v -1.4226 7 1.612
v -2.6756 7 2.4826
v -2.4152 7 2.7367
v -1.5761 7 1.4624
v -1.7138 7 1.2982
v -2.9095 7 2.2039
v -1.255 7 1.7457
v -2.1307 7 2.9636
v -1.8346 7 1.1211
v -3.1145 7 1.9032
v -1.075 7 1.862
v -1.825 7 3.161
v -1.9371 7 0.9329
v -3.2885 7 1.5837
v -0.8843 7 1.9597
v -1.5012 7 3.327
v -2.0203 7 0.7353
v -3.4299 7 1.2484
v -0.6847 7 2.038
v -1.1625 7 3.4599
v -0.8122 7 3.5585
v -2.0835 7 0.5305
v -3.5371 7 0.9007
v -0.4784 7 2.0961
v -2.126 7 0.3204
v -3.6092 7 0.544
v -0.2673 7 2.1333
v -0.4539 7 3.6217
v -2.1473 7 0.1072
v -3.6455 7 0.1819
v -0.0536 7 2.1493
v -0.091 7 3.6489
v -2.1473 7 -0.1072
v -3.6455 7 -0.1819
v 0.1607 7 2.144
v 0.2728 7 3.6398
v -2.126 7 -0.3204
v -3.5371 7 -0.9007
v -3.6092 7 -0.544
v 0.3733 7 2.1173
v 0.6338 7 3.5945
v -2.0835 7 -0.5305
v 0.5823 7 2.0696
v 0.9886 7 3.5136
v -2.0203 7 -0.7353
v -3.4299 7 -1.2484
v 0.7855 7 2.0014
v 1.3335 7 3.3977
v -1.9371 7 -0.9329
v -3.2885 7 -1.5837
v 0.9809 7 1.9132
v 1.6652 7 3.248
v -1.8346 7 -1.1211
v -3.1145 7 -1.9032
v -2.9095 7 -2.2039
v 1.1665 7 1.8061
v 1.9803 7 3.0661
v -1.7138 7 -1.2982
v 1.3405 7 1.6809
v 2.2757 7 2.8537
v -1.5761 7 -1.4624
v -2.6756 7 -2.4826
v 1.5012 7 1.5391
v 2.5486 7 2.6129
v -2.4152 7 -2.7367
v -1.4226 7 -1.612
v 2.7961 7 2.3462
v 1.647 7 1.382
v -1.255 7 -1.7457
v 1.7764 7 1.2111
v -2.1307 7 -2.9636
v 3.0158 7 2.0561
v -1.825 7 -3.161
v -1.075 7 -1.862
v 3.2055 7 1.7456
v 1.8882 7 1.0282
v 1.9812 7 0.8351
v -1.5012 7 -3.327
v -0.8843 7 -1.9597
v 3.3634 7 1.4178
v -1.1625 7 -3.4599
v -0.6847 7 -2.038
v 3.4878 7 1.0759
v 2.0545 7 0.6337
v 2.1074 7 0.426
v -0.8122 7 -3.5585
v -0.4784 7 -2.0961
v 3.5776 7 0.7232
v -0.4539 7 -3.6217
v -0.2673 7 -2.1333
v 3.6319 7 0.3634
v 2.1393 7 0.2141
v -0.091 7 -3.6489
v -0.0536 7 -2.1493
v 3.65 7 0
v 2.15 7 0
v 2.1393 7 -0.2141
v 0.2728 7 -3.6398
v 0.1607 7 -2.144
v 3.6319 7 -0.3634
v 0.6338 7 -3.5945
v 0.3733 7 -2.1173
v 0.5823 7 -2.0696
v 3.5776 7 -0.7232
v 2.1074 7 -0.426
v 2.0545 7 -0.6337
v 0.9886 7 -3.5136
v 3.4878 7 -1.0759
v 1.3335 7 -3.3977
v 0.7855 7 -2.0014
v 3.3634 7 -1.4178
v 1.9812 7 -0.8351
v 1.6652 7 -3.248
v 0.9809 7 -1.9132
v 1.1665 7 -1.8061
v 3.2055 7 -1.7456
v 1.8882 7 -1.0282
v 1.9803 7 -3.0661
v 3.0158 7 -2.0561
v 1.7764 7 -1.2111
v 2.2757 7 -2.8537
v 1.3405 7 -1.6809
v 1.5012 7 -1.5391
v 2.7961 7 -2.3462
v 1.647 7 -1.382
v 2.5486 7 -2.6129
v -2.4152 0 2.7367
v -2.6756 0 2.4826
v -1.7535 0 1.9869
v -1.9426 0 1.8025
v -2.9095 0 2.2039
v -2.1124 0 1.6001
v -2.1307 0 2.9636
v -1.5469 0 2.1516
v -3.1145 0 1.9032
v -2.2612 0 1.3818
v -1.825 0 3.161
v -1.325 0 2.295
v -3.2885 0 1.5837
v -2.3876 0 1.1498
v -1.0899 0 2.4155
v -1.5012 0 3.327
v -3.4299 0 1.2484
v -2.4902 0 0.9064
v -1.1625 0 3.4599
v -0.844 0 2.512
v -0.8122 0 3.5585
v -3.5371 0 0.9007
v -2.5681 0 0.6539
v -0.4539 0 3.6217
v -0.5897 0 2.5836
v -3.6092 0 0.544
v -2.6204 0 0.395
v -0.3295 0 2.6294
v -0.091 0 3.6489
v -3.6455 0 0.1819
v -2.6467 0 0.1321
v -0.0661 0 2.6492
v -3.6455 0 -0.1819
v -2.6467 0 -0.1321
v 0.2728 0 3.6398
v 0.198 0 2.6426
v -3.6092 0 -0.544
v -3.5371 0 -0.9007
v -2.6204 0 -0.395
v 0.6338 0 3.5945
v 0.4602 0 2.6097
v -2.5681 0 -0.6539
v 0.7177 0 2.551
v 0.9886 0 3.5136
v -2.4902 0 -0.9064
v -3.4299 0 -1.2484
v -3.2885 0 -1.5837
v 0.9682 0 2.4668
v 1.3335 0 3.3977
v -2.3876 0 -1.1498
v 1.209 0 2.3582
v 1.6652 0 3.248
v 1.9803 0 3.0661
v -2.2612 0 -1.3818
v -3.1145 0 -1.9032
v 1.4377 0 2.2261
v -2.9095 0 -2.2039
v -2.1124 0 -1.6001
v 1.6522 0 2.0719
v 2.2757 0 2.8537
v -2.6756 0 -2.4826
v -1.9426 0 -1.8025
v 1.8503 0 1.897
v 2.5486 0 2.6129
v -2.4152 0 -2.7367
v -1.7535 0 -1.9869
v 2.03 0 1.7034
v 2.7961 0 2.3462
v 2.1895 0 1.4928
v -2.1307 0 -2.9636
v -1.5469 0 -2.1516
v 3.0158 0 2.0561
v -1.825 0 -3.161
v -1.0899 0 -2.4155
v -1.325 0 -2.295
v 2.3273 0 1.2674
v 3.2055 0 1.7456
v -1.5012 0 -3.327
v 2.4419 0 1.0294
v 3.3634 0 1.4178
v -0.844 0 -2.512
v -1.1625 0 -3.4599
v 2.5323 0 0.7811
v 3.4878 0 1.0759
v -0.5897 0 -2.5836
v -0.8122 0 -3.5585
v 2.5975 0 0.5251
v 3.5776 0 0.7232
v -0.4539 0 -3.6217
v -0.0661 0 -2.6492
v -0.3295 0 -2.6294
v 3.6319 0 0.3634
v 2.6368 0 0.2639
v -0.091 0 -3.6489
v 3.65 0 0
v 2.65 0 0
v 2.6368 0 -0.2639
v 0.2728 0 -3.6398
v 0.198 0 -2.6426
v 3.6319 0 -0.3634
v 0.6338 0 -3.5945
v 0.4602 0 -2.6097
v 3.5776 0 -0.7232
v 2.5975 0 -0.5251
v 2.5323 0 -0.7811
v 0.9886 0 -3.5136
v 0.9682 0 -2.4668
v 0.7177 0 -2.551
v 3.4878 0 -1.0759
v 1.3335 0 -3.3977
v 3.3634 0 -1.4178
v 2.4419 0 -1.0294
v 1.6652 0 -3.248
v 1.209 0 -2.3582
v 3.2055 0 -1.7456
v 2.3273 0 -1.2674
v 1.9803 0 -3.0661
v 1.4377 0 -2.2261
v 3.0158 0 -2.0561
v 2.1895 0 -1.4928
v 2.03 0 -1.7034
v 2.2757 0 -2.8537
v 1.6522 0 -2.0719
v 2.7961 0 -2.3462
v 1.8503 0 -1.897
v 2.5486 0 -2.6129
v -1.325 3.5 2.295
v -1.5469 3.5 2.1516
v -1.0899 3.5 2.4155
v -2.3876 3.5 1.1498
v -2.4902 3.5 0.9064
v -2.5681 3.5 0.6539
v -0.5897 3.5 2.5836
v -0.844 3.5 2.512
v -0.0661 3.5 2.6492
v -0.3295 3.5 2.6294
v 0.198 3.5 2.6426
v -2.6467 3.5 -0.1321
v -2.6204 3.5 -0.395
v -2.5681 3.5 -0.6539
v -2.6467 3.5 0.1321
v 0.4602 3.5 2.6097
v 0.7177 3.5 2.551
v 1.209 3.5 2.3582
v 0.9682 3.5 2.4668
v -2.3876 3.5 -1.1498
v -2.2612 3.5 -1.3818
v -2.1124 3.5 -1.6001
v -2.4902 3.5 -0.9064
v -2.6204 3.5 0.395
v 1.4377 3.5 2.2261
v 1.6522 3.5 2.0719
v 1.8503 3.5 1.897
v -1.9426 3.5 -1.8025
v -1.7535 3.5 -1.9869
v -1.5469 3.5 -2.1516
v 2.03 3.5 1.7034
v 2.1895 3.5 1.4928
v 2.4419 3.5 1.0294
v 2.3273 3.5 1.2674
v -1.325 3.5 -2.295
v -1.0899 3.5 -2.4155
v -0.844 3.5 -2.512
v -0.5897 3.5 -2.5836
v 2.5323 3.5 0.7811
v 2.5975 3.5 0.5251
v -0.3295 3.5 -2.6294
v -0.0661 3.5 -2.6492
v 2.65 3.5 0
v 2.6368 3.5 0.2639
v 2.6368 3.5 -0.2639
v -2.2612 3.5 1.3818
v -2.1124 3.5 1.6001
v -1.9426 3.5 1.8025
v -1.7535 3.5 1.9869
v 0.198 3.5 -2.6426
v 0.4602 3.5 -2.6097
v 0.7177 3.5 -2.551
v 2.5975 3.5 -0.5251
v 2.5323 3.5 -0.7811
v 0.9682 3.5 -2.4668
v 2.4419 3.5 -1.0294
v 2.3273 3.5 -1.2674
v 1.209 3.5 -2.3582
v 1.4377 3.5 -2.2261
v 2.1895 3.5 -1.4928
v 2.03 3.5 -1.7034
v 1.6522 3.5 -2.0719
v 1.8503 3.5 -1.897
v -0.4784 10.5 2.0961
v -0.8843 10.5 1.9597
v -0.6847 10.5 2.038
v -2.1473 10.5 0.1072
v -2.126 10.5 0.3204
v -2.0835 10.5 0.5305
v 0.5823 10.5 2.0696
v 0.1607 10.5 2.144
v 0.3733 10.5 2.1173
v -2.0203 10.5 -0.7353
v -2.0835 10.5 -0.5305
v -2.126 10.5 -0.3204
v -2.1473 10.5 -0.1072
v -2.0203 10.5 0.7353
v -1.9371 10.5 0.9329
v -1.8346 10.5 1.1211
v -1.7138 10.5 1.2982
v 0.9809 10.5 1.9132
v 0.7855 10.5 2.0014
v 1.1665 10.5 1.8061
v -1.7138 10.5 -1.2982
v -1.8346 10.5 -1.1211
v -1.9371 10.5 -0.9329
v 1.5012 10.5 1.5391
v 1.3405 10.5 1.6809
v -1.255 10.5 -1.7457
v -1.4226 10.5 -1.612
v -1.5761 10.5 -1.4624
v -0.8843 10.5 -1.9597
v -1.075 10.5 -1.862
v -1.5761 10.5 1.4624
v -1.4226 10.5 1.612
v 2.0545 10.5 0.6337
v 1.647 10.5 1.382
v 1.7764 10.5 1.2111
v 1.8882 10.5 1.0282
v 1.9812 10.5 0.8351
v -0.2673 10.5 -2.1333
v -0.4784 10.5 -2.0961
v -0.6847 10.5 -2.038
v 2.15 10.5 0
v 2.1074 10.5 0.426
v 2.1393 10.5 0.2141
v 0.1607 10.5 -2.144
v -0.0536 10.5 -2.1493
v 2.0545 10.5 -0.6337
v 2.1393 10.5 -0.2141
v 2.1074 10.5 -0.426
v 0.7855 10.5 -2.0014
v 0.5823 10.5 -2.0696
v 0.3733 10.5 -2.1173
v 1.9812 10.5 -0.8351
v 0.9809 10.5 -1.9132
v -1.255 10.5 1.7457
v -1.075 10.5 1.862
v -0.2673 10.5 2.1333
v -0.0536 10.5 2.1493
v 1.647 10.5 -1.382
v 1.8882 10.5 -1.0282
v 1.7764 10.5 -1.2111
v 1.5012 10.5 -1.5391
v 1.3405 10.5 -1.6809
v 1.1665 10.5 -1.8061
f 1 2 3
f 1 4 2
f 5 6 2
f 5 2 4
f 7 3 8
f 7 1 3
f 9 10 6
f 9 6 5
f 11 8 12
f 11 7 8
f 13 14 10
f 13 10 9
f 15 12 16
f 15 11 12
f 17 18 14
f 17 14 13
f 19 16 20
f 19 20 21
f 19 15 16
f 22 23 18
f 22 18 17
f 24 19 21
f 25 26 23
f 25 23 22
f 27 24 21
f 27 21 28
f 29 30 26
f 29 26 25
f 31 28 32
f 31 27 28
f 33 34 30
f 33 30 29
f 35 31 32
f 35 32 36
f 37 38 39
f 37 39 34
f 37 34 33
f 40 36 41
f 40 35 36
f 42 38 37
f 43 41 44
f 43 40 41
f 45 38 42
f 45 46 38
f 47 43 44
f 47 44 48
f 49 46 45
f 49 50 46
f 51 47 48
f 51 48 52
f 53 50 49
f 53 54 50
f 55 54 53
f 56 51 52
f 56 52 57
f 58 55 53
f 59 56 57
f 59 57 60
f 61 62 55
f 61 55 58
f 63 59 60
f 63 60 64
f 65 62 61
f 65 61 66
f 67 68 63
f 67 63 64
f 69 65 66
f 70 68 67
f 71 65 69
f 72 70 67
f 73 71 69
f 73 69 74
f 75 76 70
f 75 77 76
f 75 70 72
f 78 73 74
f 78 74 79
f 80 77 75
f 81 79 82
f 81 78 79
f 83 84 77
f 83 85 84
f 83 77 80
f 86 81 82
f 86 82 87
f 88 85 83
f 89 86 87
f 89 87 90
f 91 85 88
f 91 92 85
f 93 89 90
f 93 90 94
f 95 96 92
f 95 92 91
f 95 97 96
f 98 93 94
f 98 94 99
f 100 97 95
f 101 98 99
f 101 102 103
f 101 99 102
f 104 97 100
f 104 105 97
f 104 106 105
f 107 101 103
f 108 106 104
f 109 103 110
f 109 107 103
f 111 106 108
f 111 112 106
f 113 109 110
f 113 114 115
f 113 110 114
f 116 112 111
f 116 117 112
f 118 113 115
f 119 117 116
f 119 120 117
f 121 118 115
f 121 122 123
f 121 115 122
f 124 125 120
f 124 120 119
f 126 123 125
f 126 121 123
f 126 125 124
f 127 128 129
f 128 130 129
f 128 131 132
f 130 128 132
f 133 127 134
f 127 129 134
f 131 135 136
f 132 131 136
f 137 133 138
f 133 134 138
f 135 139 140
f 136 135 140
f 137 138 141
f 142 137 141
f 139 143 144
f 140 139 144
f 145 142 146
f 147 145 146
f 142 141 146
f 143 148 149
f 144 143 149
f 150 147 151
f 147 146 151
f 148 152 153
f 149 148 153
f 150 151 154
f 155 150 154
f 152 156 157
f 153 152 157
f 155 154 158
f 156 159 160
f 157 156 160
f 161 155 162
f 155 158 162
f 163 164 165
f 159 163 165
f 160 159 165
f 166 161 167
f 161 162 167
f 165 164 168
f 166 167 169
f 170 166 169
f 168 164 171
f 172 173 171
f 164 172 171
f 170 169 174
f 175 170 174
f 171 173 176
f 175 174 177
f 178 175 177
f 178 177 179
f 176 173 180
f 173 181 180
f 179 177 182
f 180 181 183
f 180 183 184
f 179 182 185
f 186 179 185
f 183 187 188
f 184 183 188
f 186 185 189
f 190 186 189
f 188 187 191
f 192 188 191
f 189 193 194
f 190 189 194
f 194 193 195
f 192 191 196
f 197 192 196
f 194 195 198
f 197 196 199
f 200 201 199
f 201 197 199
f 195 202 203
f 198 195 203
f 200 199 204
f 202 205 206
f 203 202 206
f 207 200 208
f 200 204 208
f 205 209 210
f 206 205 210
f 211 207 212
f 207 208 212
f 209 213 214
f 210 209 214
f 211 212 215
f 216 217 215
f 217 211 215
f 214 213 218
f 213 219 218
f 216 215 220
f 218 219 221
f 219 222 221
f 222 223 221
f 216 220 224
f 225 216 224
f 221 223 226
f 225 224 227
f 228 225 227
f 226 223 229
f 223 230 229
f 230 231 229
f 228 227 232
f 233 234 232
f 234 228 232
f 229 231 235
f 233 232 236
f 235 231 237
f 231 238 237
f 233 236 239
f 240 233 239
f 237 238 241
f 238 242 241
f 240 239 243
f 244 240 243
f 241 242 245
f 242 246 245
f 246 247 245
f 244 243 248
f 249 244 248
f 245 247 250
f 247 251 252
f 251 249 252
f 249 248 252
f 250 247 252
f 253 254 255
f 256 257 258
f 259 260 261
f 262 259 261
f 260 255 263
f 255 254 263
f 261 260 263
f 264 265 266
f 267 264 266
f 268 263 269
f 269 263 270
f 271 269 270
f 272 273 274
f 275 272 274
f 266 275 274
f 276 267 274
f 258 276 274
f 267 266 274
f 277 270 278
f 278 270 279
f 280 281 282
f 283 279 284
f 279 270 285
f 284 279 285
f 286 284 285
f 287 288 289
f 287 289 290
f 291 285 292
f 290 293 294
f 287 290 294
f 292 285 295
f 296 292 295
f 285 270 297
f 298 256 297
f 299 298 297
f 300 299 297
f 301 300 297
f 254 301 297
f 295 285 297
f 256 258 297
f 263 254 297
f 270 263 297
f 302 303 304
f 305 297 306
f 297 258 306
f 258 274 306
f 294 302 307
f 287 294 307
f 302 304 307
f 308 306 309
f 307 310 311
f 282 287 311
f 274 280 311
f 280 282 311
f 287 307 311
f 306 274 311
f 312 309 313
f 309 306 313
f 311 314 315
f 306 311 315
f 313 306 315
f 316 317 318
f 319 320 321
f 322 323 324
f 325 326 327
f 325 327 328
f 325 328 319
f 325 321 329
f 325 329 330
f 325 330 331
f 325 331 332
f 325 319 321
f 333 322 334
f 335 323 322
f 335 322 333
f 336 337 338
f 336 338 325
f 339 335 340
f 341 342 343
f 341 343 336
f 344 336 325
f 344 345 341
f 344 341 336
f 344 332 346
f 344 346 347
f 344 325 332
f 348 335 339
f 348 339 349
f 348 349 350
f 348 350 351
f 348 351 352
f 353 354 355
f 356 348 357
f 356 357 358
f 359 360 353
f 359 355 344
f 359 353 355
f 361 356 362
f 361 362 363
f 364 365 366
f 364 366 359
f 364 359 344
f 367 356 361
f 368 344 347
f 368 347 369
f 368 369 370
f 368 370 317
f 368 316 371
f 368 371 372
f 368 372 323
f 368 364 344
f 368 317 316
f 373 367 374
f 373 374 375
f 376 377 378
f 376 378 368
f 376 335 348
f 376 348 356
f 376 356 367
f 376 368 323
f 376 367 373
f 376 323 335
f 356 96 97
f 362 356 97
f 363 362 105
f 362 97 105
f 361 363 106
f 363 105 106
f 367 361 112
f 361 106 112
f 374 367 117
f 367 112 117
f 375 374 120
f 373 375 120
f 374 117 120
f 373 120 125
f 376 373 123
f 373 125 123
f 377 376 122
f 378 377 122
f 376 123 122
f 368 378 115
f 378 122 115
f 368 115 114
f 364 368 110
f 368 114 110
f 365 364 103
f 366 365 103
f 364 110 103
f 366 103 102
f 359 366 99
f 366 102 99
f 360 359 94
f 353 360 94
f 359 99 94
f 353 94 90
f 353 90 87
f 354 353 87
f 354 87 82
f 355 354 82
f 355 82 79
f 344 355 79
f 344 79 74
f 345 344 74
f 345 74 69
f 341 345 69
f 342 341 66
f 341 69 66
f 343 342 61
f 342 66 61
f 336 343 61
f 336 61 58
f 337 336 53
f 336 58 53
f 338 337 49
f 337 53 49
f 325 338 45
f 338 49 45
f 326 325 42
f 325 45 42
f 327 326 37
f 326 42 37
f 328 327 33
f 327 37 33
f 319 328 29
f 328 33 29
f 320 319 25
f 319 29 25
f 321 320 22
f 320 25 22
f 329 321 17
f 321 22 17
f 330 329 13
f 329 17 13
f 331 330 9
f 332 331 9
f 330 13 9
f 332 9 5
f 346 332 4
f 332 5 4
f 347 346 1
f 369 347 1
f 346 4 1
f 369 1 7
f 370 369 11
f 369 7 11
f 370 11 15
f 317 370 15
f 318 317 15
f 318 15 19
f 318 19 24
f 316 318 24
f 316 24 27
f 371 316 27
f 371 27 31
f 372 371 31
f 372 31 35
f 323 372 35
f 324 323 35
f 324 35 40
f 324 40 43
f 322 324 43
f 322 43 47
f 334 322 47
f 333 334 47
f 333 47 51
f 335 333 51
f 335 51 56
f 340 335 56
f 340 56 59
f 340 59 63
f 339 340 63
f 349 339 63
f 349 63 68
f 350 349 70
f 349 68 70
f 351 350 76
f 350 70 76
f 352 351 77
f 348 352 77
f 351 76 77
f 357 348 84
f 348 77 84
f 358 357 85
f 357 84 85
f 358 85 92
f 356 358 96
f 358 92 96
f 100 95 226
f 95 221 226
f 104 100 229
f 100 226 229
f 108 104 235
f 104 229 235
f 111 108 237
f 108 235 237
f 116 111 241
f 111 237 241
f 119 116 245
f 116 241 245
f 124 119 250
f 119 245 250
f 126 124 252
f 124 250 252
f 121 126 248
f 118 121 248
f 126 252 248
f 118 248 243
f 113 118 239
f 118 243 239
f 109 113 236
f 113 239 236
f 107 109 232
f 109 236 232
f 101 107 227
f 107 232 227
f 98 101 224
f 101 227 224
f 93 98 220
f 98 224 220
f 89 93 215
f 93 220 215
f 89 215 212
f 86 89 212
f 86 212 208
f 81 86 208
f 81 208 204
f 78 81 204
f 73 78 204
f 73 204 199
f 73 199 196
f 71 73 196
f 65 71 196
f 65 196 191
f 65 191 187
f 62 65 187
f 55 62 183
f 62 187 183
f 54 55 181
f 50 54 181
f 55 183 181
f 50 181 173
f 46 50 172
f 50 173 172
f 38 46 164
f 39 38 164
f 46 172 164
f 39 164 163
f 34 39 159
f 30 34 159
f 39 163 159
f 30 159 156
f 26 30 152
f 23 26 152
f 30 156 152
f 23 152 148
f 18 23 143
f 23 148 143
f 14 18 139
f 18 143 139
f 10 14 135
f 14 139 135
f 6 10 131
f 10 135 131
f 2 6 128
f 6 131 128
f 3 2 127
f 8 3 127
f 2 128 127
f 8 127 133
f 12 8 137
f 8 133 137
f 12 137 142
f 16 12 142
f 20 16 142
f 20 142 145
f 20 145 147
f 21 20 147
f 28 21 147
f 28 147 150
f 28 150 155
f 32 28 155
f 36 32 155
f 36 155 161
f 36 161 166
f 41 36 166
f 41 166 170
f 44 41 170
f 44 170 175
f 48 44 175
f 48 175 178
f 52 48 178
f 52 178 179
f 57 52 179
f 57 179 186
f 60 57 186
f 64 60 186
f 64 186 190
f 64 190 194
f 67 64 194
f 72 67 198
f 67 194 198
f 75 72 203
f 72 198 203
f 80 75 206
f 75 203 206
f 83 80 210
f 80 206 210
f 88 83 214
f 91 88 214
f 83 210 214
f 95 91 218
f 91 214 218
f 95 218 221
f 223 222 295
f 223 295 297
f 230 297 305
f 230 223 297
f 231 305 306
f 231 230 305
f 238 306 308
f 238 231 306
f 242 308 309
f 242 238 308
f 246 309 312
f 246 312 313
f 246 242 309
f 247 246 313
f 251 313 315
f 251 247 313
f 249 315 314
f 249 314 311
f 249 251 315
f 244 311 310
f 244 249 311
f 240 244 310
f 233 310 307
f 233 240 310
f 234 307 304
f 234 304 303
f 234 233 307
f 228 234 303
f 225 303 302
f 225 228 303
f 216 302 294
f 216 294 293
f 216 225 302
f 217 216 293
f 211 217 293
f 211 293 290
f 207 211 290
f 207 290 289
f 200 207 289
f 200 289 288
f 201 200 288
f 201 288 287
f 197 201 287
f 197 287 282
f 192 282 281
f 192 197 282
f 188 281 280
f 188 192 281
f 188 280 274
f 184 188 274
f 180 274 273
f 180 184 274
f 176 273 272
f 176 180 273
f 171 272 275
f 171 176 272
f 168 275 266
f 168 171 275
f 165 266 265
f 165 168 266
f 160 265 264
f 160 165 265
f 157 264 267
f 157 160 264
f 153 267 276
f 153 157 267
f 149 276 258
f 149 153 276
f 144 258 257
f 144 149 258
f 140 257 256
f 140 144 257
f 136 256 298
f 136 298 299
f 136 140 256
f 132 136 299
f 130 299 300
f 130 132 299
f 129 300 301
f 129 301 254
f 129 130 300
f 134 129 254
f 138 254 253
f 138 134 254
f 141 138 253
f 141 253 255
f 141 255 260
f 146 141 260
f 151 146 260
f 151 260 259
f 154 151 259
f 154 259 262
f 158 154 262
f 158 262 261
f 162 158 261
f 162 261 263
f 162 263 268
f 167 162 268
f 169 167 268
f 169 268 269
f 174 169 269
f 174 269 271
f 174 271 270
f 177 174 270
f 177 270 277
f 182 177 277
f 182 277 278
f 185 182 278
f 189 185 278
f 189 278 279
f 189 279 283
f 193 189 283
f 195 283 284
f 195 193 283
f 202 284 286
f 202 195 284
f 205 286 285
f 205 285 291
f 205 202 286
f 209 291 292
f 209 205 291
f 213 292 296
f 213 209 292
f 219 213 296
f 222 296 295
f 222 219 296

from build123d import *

# Parameters (mm, degrees)
CROQUIS1_R              = 3.65
CROQUIS1_R_2            = 2.65
SALIENTE_EXTRUIR1_DEPTH = 3.5
CROQUIS2_R              = 3.65
SALIENTE_EXTRUIR2_DEPTH = 3.5
CROQUIS3_R              = 2.15
SALIENTE_EXTRUIR3_DEPTH = 3.5


with BuildPart() as part:
    # Croquis1 → Saliente-Extruir1 (new body)
    with BuildSketch(Plane(origin=(0, 0, 0), x_dir=(1, 0, 0), z_dir=(0, 1, 0))):
        Circle(CROQUIS1_R)
        Circle(CROQUIS1_R_2, mode=Mode.SUBTRACT)
    extrude(amount=SALIENTE_EXTRUIR1_DEPTH)

    # Croquis2 → Saliente-Extruir2 (add)
    with BuildSketch(Plane(origin=(0, 3.5, 0), x_dir=(1, 0, 0), z_dir=(0, 1, 0))):
        Circle(CROQUIS2_R)
    extrude(amount=SALIENTE_EXTRUIR2_DEPTH)

    # Croquis3 → Saliente-Extruir3 (add)
    with BuildSketch(Plane(origin=(0, 7, 0), x_dir=(1, 0, 0), z_dir=(0, 1, 0))):
        Circle(CROQUIS3_R)
    extrude(amount=SALIENTE_EXTRUIR3_DEPTH)


solid = part.part
